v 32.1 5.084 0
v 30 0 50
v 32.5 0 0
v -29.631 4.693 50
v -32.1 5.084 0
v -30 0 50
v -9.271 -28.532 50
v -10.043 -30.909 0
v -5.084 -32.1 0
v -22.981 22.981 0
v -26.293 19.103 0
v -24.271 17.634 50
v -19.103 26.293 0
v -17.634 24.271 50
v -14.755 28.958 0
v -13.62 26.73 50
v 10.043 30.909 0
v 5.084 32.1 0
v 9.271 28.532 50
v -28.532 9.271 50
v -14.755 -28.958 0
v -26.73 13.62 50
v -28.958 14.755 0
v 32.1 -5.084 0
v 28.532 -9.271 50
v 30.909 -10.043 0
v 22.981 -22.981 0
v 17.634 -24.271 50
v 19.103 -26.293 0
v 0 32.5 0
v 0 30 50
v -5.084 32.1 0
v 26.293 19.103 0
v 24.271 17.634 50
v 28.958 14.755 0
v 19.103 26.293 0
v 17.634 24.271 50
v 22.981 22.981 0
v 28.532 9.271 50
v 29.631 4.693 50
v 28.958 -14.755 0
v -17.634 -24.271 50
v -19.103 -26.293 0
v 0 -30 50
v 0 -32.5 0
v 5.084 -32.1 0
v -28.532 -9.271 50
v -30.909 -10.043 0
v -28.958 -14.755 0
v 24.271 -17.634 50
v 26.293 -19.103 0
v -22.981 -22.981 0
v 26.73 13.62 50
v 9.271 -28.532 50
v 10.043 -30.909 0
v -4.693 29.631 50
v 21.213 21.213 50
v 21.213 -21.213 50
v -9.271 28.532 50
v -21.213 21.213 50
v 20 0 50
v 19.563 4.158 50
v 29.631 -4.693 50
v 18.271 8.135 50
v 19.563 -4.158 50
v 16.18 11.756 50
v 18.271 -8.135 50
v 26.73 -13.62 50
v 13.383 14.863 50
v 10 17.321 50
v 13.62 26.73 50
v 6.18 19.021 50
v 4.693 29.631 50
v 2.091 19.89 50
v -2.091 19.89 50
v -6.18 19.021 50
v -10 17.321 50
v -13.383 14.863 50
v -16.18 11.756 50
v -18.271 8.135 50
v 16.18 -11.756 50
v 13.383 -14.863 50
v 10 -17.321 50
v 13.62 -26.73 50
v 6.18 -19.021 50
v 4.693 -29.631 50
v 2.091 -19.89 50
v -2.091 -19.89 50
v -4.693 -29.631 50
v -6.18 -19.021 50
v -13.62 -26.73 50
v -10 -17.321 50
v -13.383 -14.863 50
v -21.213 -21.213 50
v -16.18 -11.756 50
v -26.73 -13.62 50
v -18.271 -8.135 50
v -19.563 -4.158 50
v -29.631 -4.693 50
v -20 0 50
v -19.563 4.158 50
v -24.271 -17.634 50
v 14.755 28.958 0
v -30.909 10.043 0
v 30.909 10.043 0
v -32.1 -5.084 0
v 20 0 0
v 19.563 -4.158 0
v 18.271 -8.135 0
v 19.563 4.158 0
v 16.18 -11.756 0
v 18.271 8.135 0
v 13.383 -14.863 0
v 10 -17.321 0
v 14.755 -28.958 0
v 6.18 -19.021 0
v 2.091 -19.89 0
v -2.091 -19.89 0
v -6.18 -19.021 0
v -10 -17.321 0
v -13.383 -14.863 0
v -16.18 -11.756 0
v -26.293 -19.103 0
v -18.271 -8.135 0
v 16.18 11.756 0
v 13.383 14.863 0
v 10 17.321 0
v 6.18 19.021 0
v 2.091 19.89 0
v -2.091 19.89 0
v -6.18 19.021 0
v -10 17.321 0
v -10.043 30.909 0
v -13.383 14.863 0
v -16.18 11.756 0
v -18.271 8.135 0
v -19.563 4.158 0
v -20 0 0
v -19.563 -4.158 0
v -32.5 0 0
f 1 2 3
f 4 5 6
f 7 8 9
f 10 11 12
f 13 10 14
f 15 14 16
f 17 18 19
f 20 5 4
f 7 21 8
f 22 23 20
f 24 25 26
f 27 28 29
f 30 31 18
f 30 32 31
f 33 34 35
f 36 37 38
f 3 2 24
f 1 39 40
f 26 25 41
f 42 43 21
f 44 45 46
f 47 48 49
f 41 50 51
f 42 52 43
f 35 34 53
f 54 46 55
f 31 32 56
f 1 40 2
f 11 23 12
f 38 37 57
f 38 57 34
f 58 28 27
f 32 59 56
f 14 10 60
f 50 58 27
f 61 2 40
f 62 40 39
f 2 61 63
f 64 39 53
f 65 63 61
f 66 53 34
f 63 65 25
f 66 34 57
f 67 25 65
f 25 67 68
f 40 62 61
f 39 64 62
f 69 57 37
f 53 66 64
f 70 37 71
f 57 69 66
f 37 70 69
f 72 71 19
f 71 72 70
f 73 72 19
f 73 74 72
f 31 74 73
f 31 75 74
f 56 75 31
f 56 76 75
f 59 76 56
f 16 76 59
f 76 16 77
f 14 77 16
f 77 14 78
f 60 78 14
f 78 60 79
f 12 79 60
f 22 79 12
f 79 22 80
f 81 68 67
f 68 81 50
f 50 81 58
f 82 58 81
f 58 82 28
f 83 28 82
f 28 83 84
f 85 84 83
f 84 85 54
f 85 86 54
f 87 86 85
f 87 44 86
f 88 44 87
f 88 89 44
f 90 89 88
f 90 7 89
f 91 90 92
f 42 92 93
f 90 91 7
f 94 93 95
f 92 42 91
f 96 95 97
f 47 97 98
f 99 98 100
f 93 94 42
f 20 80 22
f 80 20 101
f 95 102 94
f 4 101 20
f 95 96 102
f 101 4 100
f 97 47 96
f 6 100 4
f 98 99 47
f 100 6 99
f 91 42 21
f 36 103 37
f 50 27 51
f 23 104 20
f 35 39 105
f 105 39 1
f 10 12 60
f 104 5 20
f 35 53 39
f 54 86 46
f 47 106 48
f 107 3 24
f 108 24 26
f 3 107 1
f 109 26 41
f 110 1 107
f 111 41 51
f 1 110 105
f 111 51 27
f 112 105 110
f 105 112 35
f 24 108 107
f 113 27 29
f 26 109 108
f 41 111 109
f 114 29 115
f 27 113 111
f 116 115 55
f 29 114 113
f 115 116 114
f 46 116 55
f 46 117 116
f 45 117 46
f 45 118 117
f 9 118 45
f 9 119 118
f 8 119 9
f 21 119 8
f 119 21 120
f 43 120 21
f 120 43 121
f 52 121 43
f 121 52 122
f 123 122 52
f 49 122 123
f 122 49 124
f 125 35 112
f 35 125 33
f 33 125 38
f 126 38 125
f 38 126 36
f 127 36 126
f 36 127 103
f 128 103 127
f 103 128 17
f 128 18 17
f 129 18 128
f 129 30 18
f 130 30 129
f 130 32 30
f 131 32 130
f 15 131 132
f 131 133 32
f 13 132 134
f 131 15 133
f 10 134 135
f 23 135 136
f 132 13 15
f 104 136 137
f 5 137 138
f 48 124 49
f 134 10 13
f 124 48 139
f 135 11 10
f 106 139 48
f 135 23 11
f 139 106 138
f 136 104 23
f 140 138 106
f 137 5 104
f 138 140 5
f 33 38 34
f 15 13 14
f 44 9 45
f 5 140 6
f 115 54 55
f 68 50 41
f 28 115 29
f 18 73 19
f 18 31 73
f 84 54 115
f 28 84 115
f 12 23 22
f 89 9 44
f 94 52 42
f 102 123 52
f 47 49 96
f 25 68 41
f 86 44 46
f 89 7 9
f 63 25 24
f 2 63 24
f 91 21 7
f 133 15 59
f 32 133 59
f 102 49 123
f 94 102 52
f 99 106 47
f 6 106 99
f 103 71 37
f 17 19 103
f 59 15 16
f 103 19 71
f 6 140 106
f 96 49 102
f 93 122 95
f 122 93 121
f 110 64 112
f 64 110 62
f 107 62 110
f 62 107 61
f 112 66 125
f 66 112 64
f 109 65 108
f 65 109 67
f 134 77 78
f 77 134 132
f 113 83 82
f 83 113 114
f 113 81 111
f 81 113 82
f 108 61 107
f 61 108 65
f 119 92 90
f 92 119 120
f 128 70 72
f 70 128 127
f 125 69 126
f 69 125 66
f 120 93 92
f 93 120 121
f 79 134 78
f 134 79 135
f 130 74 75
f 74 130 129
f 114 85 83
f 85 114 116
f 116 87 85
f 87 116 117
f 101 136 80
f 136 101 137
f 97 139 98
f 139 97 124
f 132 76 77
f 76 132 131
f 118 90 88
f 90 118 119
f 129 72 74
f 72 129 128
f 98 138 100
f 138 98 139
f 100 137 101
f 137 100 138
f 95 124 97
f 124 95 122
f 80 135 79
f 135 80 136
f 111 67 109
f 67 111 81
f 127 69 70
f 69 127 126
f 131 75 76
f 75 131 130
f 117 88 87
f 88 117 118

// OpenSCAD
// file: ../../tower-segment.scad
module baradDur_towerSegment(bottomRadius, topRadius, zLength)
{
	color("gray")
	difference()
	{
    	cylinder(h=zLength, r1=bottomRadius, r2=topRadius, $fn=40);

		translate([0, 0, -0.01])
		cylinder(r=topRadius - 10, h=zLength + 0.02);//, center=true);
	}
}

function towerSegment_girthIncrement() = 2.5;

function baradDur_towerSegment_zLength() = 50;
// file: ../tower-segment-0.scad
use <../tower-segment.scad>

/**
 * This is the top most tower segment
 */
module baradDur_towerSegment_0(brackets = false)
{
	union()
	{
		baradDur_towerSegment(bottomRadius = baradDur_towerSegment_0_bottomRadius(),
						  topRadius = baradDur_towerSegment_0_topRadius(),
						  zLength=baradDur_towerSegment_zLength() );

        if(brackets)
		{
			echo("farto");
		}
	}
}

/** Support functions and modules follow. **/

function baradDur_towerSegment_0_bottomRadius() = baradDur_towerSegment_0_topRadius() + towerSegment_girthIncrement();

function baradDur_towerSegment_0_topRadius() = 30;
// main file
use <../tower-segment-0.scad>

baradDur_towerSegment_0(brackets = true);
